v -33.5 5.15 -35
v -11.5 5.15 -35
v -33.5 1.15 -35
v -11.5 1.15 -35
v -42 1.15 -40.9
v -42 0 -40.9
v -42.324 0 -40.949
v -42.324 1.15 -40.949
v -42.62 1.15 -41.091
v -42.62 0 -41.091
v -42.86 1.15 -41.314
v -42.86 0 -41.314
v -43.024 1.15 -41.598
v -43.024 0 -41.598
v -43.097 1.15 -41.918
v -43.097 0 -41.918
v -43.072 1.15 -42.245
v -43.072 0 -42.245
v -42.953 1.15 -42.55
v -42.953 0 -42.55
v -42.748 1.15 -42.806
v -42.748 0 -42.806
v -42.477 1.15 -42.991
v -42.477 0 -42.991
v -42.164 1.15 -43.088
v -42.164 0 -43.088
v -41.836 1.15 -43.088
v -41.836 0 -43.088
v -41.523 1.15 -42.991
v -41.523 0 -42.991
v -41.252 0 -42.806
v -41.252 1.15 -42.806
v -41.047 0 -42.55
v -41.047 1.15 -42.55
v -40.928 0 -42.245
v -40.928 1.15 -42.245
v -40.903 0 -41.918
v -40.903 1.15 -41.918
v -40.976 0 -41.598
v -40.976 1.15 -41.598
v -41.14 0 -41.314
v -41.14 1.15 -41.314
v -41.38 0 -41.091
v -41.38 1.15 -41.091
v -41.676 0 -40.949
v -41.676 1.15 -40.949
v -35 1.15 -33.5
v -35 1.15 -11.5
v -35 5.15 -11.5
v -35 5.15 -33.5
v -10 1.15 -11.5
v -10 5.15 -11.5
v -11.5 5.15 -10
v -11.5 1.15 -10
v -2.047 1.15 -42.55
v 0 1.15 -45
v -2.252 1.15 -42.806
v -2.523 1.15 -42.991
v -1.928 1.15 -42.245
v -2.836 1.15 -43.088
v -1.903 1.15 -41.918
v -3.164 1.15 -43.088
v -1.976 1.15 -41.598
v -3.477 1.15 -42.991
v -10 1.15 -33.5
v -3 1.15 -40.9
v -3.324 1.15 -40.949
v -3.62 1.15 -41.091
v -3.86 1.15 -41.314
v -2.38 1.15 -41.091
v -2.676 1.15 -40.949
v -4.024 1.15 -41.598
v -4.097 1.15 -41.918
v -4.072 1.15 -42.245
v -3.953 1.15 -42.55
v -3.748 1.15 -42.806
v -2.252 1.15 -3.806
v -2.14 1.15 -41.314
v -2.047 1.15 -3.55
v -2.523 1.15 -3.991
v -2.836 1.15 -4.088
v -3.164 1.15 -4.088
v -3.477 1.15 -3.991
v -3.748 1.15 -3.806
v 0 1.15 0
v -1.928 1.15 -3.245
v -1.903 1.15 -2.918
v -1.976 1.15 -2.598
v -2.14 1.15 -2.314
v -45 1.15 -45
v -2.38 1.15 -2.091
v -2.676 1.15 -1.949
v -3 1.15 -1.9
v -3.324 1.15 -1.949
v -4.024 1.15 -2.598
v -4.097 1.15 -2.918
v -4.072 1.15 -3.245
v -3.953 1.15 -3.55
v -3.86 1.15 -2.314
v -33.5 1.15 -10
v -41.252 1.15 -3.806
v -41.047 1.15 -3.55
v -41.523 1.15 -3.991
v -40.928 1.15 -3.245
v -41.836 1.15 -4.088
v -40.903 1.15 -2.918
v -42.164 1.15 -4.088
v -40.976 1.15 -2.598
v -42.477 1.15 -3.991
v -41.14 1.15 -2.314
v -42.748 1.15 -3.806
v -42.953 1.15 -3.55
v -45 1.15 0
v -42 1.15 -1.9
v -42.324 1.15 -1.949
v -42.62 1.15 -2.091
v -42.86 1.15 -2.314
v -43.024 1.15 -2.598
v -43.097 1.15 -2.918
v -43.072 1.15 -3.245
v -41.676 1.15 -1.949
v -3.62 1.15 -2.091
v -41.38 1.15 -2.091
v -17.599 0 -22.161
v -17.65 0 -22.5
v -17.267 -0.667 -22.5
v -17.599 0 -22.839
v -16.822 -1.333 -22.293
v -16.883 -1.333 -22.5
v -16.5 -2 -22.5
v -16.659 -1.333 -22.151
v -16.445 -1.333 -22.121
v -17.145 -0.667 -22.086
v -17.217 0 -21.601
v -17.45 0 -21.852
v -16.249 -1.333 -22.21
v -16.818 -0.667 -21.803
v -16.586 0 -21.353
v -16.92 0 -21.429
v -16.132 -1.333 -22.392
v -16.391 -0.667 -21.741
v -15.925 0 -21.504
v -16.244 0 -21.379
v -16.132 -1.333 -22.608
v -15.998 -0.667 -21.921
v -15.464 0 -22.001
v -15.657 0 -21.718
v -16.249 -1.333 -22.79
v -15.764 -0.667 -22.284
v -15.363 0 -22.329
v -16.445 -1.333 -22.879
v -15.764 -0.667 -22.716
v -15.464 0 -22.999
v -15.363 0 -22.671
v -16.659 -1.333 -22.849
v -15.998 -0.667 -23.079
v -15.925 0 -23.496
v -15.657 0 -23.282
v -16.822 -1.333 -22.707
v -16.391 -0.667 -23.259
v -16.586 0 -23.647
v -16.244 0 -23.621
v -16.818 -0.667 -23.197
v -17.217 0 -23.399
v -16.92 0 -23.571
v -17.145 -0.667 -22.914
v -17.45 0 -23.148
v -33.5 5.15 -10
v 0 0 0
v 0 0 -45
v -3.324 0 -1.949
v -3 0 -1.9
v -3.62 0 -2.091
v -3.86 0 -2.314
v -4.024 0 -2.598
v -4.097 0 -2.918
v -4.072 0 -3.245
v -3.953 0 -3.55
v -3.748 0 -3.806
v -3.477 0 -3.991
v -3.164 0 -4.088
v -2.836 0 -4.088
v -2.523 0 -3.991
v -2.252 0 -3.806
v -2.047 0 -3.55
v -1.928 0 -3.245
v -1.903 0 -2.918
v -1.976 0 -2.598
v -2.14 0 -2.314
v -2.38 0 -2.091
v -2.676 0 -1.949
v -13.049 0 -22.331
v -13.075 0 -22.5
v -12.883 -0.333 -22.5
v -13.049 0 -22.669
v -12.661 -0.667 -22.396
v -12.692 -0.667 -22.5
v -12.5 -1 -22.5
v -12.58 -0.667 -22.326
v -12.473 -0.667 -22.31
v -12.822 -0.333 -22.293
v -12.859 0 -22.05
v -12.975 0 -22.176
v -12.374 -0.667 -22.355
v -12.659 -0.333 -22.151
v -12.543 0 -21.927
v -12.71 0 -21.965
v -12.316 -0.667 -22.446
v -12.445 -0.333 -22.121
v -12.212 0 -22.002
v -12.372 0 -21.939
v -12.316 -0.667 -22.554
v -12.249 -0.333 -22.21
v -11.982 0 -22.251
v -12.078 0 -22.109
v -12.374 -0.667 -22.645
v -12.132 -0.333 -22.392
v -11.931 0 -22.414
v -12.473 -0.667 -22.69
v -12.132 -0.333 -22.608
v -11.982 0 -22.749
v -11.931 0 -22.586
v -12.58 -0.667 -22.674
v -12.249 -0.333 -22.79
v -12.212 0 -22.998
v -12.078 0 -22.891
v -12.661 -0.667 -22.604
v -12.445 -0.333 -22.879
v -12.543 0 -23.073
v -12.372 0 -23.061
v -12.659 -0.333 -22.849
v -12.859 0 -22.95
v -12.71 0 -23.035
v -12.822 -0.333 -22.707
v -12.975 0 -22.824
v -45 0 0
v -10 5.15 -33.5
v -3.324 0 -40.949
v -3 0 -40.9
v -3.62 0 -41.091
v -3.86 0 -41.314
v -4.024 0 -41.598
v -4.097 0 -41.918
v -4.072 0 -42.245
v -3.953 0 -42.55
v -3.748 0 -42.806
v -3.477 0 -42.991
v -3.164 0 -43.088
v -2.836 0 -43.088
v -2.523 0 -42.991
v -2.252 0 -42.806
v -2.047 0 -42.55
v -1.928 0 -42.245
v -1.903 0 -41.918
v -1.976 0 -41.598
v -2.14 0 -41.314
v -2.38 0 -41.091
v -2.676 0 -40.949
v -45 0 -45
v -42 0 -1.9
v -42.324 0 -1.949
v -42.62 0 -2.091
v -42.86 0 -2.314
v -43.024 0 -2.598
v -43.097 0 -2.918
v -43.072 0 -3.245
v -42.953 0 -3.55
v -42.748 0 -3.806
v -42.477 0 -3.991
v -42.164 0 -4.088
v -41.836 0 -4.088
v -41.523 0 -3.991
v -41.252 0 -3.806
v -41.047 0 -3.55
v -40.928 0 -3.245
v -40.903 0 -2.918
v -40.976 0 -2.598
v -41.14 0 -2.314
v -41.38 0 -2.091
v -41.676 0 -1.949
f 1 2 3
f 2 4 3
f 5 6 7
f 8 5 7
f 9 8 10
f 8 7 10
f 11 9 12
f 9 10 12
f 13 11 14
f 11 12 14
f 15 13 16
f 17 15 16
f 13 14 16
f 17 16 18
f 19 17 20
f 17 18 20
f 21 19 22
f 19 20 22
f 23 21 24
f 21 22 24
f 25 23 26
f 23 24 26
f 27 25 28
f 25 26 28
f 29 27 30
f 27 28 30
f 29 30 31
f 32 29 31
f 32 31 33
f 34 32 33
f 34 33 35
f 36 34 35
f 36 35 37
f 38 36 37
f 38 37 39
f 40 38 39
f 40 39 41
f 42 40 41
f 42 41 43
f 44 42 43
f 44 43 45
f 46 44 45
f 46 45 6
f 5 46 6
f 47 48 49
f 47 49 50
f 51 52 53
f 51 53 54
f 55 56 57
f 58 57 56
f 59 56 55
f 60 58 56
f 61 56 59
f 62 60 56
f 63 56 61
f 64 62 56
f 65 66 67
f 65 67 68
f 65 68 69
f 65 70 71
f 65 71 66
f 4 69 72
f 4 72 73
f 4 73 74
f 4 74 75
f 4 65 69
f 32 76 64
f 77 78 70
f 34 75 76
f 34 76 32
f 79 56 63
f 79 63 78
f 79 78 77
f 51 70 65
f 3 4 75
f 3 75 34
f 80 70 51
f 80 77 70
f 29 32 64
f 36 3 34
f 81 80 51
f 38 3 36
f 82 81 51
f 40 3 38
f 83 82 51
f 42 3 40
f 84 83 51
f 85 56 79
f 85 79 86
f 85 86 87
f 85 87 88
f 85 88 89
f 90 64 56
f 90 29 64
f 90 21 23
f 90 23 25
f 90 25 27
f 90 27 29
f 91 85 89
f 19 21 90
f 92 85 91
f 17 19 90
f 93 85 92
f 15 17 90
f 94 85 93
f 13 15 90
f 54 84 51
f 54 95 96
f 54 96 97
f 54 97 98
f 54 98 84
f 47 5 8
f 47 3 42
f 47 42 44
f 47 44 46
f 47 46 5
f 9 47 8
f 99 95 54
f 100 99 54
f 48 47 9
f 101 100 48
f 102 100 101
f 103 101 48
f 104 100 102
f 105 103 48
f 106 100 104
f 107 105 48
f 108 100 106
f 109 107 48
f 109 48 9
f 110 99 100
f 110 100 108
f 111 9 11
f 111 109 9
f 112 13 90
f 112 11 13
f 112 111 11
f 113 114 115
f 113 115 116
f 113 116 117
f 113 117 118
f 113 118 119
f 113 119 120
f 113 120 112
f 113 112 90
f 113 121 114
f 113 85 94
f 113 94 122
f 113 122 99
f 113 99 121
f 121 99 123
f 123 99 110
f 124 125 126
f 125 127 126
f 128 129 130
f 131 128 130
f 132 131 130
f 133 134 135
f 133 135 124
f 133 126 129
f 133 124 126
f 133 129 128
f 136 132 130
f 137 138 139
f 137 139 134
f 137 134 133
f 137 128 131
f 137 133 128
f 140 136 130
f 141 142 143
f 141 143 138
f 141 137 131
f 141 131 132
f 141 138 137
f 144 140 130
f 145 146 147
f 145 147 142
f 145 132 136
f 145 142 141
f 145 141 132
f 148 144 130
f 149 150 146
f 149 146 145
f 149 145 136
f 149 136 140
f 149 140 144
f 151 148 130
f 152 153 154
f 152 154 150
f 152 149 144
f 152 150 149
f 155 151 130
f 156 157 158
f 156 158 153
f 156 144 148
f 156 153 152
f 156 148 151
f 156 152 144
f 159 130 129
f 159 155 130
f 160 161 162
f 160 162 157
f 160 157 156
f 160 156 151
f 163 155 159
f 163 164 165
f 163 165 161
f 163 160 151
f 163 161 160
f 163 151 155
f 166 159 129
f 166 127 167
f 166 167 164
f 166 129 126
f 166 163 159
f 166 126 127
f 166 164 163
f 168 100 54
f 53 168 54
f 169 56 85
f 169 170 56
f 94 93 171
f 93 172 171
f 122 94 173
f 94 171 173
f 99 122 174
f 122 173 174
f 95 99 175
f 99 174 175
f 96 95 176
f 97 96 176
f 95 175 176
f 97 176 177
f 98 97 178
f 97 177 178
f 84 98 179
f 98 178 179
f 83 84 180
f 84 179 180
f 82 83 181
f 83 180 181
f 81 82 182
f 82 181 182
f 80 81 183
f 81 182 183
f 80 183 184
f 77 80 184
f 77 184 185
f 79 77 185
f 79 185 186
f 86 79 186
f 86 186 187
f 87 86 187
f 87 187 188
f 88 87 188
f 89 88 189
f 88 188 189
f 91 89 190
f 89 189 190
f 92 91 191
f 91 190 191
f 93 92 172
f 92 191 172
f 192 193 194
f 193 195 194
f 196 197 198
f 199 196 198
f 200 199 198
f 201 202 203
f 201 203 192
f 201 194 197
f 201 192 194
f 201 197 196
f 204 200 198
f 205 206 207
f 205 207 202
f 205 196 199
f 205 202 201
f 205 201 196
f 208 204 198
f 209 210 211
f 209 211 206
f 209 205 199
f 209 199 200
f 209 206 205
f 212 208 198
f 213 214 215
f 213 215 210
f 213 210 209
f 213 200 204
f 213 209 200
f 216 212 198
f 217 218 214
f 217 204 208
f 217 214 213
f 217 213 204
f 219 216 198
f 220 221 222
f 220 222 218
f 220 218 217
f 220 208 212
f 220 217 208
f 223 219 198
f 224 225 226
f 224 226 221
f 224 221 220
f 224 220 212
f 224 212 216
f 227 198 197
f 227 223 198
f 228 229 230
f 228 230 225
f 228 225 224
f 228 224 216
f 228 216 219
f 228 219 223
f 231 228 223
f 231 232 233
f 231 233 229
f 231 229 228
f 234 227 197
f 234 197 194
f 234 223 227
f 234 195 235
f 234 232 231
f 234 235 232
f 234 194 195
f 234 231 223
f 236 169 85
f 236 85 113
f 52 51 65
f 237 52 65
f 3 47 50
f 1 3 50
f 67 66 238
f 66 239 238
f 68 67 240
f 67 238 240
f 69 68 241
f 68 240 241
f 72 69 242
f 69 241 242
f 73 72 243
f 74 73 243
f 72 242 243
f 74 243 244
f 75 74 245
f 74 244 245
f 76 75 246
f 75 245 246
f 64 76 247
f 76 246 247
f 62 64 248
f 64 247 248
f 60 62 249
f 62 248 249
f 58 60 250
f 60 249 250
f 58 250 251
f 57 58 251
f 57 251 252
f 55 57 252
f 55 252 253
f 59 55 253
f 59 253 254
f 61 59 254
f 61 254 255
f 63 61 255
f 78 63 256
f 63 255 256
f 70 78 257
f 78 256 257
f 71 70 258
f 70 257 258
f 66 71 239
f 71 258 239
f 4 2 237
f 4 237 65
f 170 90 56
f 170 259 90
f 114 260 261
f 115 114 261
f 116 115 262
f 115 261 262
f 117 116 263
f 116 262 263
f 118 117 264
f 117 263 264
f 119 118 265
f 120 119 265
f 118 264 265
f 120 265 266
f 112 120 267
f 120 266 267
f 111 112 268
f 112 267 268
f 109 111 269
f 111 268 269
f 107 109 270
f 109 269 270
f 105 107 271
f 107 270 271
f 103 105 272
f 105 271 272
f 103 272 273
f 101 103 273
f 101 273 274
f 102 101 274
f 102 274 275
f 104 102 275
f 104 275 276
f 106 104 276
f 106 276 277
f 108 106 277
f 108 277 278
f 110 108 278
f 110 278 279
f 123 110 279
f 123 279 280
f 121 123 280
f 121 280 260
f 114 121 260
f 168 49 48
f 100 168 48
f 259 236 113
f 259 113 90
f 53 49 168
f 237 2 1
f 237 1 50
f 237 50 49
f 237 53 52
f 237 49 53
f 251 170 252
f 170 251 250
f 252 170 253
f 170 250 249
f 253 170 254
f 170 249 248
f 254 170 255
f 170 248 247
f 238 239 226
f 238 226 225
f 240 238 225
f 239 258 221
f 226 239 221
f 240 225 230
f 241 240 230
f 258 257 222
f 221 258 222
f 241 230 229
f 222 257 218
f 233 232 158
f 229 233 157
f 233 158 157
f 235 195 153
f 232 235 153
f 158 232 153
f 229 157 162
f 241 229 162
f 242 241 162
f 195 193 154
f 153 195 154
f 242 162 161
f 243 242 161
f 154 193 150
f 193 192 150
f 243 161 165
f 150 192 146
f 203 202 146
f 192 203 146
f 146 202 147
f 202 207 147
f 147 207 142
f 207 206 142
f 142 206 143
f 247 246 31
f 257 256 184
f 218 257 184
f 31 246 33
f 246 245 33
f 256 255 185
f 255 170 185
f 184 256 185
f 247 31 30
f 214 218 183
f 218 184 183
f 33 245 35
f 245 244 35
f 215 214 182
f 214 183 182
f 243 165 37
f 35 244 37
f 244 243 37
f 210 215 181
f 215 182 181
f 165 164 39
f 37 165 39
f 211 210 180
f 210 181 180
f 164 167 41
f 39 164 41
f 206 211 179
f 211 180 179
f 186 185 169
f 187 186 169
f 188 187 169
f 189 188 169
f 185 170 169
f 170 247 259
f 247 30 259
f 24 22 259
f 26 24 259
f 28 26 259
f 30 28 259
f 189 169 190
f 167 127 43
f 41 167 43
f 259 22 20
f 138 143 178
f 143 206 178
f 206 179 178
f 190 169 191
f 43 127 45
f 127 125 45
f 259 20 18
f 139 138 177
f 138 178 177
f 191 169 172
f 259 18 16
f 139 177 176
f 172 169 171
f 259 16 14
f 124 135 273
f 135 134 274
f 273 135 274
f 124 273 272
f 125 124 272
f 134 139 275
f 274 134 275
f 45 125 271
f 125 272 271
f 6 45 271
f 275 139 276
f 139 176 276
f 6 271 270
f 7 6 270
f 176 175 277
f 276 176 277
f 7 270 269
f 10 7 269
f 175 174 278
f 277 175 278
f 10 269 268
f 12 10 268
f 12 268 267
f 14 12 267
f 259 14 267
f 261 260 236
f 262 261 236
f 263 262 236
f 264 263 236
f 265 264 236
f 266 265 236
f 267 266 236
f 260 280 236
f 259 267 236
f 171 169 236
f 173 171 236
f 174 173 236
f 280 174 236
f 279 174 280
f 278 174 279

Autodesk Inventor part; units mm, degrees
ref_plane "YZ Plane" through (0, 0, 0) normal (1, 0, 0) x (0, 1, 0)
ref_plane "XZ Plane" through (0, 0, 0) normal (0, 1, 0) x (-1, 0, 0)
sketch "Sketch1" plane through (0, 0, 0) normal (0, 1, 0) x (-1, 0, 0)
  line L0 (0, 0) -> (45, 0)
  line L1 (45, 0) -> (45, -45)
  line L2 (45, -45) -> (0, -45)
  line L3 (0, -45) -> (0, 0)
  dimension "d0" = 45
  dimension "d1" = 45
extrude "Extrusion1" add sketch "Sketch1" along normal blind 1.15
sketch "Sketch2" plane through (0, 1.15, 0) normal (0, 1, 0) x (1, 0, 0)
  line L0 (-45, 45) -> (-45, 0) projected
  line L1 (-45, 0) -> (-45, 3)
  line L2 (-45, 3) -> (-42, 3)
  line L3 (-45, 22.5) -> (-42, 22.5)
  line L4 (-45, 45) -> (-45, 42)
  line L5 (-45, 42) -> (-42, 42)
  line L6 (0, 45) -> (-45, 45) projected
  line L7 (-22.5, 45) -> (-22.5, 42.897)
  line L8 (0, 45) -> (0, 0)
  line L9 (0, 0) -> (0, 3)
  line L10 (0, 3) -> (-3, 3)
  line L11 (0, 22.5) -> (-3, 22.5)
  line L12 (0, 45) -> (0, 42)
  line L13 (0, 42) -> (-3, 42)
  dimension "d4" = 3
  dimension "d5" = 3
hole "Hole1" at (-42, 1.15, -3) at (-42, 1.15, -42) at (-3, 1.15, -42) at (-3, 1.15, -3) direction (0, -1, 0) diameter 2.2 end through all clearance for "Flat Head Machine Screw" size "M2" standard "Ansi Metric M Profile"
sketch "Sketch3" plane through (0, 1.15, 0) normal (0, 1, 0) x (1, 0, 0)
  line L0 (-45, 0) -> (-45, 45) projected
  line L1 (0, 45) -> (0, 0) projected
  line L2 (-45, 45) -> (0, 45) projected
  line L3 (-35, 10) -> (-10, 10)
  line L4 (-10, 10) -> (-10, 35)
  line L5 (-10, 35) -> (-35, 35)
  line L6 (-35, 10) -> (-35, 35)
  dimension "d15" = 25
  dimension "d16" = 25
  dimension "d17" = 10
  dimension "d18" = 10
  dimension "d19" = 10
extrude "Extrusion2" add sketch "Sketch3" along normal blind 4
chamfer "Chamfer1" distance 1.5 angle 45 4 edges at (-10, 3.15, -35) (-35, 3.15, -35) (-10, 3.15, -10) (-35, 3.15, -10)
sketch "Sketch4" plane through (0, 0, 0) normal (0, -1, 0) x (1, 0, 0)
  line L0 (0, 0) -> (0, -45) projected
  line L1 (0, -22.5) -> (-12.5, -22.5)
  line L2 (-12.5, -22.5) -> (-16.5, -22.5)
  circle A0 centre (-12.5, -22.5) radius 0.5
  circle A1 centre (-16.5, -22.5) radius 0.5
  dimension "d25" = 12.5
  dimension "d26" = 4
  dimension "d27" = 1
ref_plane "Work Plane1" through (-12.5, 0, -22.5) normal (0, 0, 1) x (-1, 0, 0)
sketch "Sketch5" plane through (-12.5, 0, -22.5) normal (0, 0, 1) x (-1, 0, 0)
  line L0 (0, 0) -> (4, 0) projected
  line L1 (-12.5, 0) -> (0, 0) projected
  line L2 (4, 0) -> (4, 2)
  line L3 (4, 0) -> (5.15, 0)
  line L4 (4, 2) -> (5.15, 0)
  line L5 (0, 0) -> (0.575, 0)
  point P0 (-12.5, 0)
  dimension "d31" = 2
  dimension "d33" = 1.15
revolve "Revolution1" add sketch "Sketch5" angle 360 about axis through (-16.5, 0, -22.5) along (0, -1, 0)
sketch "Sketch6" plane through (-12.5, 0, -22.5) normal (0, 0, 1) x (-1, 0, 0)
  line L0 (0, 0) -> (0, 1)
  line L1 (0, 0) -> (0.575, 0)
  line L2 (0, 1) -> (0.575, 0)
  point P0 (-12.5, 0)
  dimension "d36" = 1
  dimension "d37" = 0.575
revolve "Revolution2" add sketch "Sketch6" angle 360 about axis through (-12.5, 0, -22.5) along (0, -1, 0)
properties part number "Patch_Antenna_V1"
